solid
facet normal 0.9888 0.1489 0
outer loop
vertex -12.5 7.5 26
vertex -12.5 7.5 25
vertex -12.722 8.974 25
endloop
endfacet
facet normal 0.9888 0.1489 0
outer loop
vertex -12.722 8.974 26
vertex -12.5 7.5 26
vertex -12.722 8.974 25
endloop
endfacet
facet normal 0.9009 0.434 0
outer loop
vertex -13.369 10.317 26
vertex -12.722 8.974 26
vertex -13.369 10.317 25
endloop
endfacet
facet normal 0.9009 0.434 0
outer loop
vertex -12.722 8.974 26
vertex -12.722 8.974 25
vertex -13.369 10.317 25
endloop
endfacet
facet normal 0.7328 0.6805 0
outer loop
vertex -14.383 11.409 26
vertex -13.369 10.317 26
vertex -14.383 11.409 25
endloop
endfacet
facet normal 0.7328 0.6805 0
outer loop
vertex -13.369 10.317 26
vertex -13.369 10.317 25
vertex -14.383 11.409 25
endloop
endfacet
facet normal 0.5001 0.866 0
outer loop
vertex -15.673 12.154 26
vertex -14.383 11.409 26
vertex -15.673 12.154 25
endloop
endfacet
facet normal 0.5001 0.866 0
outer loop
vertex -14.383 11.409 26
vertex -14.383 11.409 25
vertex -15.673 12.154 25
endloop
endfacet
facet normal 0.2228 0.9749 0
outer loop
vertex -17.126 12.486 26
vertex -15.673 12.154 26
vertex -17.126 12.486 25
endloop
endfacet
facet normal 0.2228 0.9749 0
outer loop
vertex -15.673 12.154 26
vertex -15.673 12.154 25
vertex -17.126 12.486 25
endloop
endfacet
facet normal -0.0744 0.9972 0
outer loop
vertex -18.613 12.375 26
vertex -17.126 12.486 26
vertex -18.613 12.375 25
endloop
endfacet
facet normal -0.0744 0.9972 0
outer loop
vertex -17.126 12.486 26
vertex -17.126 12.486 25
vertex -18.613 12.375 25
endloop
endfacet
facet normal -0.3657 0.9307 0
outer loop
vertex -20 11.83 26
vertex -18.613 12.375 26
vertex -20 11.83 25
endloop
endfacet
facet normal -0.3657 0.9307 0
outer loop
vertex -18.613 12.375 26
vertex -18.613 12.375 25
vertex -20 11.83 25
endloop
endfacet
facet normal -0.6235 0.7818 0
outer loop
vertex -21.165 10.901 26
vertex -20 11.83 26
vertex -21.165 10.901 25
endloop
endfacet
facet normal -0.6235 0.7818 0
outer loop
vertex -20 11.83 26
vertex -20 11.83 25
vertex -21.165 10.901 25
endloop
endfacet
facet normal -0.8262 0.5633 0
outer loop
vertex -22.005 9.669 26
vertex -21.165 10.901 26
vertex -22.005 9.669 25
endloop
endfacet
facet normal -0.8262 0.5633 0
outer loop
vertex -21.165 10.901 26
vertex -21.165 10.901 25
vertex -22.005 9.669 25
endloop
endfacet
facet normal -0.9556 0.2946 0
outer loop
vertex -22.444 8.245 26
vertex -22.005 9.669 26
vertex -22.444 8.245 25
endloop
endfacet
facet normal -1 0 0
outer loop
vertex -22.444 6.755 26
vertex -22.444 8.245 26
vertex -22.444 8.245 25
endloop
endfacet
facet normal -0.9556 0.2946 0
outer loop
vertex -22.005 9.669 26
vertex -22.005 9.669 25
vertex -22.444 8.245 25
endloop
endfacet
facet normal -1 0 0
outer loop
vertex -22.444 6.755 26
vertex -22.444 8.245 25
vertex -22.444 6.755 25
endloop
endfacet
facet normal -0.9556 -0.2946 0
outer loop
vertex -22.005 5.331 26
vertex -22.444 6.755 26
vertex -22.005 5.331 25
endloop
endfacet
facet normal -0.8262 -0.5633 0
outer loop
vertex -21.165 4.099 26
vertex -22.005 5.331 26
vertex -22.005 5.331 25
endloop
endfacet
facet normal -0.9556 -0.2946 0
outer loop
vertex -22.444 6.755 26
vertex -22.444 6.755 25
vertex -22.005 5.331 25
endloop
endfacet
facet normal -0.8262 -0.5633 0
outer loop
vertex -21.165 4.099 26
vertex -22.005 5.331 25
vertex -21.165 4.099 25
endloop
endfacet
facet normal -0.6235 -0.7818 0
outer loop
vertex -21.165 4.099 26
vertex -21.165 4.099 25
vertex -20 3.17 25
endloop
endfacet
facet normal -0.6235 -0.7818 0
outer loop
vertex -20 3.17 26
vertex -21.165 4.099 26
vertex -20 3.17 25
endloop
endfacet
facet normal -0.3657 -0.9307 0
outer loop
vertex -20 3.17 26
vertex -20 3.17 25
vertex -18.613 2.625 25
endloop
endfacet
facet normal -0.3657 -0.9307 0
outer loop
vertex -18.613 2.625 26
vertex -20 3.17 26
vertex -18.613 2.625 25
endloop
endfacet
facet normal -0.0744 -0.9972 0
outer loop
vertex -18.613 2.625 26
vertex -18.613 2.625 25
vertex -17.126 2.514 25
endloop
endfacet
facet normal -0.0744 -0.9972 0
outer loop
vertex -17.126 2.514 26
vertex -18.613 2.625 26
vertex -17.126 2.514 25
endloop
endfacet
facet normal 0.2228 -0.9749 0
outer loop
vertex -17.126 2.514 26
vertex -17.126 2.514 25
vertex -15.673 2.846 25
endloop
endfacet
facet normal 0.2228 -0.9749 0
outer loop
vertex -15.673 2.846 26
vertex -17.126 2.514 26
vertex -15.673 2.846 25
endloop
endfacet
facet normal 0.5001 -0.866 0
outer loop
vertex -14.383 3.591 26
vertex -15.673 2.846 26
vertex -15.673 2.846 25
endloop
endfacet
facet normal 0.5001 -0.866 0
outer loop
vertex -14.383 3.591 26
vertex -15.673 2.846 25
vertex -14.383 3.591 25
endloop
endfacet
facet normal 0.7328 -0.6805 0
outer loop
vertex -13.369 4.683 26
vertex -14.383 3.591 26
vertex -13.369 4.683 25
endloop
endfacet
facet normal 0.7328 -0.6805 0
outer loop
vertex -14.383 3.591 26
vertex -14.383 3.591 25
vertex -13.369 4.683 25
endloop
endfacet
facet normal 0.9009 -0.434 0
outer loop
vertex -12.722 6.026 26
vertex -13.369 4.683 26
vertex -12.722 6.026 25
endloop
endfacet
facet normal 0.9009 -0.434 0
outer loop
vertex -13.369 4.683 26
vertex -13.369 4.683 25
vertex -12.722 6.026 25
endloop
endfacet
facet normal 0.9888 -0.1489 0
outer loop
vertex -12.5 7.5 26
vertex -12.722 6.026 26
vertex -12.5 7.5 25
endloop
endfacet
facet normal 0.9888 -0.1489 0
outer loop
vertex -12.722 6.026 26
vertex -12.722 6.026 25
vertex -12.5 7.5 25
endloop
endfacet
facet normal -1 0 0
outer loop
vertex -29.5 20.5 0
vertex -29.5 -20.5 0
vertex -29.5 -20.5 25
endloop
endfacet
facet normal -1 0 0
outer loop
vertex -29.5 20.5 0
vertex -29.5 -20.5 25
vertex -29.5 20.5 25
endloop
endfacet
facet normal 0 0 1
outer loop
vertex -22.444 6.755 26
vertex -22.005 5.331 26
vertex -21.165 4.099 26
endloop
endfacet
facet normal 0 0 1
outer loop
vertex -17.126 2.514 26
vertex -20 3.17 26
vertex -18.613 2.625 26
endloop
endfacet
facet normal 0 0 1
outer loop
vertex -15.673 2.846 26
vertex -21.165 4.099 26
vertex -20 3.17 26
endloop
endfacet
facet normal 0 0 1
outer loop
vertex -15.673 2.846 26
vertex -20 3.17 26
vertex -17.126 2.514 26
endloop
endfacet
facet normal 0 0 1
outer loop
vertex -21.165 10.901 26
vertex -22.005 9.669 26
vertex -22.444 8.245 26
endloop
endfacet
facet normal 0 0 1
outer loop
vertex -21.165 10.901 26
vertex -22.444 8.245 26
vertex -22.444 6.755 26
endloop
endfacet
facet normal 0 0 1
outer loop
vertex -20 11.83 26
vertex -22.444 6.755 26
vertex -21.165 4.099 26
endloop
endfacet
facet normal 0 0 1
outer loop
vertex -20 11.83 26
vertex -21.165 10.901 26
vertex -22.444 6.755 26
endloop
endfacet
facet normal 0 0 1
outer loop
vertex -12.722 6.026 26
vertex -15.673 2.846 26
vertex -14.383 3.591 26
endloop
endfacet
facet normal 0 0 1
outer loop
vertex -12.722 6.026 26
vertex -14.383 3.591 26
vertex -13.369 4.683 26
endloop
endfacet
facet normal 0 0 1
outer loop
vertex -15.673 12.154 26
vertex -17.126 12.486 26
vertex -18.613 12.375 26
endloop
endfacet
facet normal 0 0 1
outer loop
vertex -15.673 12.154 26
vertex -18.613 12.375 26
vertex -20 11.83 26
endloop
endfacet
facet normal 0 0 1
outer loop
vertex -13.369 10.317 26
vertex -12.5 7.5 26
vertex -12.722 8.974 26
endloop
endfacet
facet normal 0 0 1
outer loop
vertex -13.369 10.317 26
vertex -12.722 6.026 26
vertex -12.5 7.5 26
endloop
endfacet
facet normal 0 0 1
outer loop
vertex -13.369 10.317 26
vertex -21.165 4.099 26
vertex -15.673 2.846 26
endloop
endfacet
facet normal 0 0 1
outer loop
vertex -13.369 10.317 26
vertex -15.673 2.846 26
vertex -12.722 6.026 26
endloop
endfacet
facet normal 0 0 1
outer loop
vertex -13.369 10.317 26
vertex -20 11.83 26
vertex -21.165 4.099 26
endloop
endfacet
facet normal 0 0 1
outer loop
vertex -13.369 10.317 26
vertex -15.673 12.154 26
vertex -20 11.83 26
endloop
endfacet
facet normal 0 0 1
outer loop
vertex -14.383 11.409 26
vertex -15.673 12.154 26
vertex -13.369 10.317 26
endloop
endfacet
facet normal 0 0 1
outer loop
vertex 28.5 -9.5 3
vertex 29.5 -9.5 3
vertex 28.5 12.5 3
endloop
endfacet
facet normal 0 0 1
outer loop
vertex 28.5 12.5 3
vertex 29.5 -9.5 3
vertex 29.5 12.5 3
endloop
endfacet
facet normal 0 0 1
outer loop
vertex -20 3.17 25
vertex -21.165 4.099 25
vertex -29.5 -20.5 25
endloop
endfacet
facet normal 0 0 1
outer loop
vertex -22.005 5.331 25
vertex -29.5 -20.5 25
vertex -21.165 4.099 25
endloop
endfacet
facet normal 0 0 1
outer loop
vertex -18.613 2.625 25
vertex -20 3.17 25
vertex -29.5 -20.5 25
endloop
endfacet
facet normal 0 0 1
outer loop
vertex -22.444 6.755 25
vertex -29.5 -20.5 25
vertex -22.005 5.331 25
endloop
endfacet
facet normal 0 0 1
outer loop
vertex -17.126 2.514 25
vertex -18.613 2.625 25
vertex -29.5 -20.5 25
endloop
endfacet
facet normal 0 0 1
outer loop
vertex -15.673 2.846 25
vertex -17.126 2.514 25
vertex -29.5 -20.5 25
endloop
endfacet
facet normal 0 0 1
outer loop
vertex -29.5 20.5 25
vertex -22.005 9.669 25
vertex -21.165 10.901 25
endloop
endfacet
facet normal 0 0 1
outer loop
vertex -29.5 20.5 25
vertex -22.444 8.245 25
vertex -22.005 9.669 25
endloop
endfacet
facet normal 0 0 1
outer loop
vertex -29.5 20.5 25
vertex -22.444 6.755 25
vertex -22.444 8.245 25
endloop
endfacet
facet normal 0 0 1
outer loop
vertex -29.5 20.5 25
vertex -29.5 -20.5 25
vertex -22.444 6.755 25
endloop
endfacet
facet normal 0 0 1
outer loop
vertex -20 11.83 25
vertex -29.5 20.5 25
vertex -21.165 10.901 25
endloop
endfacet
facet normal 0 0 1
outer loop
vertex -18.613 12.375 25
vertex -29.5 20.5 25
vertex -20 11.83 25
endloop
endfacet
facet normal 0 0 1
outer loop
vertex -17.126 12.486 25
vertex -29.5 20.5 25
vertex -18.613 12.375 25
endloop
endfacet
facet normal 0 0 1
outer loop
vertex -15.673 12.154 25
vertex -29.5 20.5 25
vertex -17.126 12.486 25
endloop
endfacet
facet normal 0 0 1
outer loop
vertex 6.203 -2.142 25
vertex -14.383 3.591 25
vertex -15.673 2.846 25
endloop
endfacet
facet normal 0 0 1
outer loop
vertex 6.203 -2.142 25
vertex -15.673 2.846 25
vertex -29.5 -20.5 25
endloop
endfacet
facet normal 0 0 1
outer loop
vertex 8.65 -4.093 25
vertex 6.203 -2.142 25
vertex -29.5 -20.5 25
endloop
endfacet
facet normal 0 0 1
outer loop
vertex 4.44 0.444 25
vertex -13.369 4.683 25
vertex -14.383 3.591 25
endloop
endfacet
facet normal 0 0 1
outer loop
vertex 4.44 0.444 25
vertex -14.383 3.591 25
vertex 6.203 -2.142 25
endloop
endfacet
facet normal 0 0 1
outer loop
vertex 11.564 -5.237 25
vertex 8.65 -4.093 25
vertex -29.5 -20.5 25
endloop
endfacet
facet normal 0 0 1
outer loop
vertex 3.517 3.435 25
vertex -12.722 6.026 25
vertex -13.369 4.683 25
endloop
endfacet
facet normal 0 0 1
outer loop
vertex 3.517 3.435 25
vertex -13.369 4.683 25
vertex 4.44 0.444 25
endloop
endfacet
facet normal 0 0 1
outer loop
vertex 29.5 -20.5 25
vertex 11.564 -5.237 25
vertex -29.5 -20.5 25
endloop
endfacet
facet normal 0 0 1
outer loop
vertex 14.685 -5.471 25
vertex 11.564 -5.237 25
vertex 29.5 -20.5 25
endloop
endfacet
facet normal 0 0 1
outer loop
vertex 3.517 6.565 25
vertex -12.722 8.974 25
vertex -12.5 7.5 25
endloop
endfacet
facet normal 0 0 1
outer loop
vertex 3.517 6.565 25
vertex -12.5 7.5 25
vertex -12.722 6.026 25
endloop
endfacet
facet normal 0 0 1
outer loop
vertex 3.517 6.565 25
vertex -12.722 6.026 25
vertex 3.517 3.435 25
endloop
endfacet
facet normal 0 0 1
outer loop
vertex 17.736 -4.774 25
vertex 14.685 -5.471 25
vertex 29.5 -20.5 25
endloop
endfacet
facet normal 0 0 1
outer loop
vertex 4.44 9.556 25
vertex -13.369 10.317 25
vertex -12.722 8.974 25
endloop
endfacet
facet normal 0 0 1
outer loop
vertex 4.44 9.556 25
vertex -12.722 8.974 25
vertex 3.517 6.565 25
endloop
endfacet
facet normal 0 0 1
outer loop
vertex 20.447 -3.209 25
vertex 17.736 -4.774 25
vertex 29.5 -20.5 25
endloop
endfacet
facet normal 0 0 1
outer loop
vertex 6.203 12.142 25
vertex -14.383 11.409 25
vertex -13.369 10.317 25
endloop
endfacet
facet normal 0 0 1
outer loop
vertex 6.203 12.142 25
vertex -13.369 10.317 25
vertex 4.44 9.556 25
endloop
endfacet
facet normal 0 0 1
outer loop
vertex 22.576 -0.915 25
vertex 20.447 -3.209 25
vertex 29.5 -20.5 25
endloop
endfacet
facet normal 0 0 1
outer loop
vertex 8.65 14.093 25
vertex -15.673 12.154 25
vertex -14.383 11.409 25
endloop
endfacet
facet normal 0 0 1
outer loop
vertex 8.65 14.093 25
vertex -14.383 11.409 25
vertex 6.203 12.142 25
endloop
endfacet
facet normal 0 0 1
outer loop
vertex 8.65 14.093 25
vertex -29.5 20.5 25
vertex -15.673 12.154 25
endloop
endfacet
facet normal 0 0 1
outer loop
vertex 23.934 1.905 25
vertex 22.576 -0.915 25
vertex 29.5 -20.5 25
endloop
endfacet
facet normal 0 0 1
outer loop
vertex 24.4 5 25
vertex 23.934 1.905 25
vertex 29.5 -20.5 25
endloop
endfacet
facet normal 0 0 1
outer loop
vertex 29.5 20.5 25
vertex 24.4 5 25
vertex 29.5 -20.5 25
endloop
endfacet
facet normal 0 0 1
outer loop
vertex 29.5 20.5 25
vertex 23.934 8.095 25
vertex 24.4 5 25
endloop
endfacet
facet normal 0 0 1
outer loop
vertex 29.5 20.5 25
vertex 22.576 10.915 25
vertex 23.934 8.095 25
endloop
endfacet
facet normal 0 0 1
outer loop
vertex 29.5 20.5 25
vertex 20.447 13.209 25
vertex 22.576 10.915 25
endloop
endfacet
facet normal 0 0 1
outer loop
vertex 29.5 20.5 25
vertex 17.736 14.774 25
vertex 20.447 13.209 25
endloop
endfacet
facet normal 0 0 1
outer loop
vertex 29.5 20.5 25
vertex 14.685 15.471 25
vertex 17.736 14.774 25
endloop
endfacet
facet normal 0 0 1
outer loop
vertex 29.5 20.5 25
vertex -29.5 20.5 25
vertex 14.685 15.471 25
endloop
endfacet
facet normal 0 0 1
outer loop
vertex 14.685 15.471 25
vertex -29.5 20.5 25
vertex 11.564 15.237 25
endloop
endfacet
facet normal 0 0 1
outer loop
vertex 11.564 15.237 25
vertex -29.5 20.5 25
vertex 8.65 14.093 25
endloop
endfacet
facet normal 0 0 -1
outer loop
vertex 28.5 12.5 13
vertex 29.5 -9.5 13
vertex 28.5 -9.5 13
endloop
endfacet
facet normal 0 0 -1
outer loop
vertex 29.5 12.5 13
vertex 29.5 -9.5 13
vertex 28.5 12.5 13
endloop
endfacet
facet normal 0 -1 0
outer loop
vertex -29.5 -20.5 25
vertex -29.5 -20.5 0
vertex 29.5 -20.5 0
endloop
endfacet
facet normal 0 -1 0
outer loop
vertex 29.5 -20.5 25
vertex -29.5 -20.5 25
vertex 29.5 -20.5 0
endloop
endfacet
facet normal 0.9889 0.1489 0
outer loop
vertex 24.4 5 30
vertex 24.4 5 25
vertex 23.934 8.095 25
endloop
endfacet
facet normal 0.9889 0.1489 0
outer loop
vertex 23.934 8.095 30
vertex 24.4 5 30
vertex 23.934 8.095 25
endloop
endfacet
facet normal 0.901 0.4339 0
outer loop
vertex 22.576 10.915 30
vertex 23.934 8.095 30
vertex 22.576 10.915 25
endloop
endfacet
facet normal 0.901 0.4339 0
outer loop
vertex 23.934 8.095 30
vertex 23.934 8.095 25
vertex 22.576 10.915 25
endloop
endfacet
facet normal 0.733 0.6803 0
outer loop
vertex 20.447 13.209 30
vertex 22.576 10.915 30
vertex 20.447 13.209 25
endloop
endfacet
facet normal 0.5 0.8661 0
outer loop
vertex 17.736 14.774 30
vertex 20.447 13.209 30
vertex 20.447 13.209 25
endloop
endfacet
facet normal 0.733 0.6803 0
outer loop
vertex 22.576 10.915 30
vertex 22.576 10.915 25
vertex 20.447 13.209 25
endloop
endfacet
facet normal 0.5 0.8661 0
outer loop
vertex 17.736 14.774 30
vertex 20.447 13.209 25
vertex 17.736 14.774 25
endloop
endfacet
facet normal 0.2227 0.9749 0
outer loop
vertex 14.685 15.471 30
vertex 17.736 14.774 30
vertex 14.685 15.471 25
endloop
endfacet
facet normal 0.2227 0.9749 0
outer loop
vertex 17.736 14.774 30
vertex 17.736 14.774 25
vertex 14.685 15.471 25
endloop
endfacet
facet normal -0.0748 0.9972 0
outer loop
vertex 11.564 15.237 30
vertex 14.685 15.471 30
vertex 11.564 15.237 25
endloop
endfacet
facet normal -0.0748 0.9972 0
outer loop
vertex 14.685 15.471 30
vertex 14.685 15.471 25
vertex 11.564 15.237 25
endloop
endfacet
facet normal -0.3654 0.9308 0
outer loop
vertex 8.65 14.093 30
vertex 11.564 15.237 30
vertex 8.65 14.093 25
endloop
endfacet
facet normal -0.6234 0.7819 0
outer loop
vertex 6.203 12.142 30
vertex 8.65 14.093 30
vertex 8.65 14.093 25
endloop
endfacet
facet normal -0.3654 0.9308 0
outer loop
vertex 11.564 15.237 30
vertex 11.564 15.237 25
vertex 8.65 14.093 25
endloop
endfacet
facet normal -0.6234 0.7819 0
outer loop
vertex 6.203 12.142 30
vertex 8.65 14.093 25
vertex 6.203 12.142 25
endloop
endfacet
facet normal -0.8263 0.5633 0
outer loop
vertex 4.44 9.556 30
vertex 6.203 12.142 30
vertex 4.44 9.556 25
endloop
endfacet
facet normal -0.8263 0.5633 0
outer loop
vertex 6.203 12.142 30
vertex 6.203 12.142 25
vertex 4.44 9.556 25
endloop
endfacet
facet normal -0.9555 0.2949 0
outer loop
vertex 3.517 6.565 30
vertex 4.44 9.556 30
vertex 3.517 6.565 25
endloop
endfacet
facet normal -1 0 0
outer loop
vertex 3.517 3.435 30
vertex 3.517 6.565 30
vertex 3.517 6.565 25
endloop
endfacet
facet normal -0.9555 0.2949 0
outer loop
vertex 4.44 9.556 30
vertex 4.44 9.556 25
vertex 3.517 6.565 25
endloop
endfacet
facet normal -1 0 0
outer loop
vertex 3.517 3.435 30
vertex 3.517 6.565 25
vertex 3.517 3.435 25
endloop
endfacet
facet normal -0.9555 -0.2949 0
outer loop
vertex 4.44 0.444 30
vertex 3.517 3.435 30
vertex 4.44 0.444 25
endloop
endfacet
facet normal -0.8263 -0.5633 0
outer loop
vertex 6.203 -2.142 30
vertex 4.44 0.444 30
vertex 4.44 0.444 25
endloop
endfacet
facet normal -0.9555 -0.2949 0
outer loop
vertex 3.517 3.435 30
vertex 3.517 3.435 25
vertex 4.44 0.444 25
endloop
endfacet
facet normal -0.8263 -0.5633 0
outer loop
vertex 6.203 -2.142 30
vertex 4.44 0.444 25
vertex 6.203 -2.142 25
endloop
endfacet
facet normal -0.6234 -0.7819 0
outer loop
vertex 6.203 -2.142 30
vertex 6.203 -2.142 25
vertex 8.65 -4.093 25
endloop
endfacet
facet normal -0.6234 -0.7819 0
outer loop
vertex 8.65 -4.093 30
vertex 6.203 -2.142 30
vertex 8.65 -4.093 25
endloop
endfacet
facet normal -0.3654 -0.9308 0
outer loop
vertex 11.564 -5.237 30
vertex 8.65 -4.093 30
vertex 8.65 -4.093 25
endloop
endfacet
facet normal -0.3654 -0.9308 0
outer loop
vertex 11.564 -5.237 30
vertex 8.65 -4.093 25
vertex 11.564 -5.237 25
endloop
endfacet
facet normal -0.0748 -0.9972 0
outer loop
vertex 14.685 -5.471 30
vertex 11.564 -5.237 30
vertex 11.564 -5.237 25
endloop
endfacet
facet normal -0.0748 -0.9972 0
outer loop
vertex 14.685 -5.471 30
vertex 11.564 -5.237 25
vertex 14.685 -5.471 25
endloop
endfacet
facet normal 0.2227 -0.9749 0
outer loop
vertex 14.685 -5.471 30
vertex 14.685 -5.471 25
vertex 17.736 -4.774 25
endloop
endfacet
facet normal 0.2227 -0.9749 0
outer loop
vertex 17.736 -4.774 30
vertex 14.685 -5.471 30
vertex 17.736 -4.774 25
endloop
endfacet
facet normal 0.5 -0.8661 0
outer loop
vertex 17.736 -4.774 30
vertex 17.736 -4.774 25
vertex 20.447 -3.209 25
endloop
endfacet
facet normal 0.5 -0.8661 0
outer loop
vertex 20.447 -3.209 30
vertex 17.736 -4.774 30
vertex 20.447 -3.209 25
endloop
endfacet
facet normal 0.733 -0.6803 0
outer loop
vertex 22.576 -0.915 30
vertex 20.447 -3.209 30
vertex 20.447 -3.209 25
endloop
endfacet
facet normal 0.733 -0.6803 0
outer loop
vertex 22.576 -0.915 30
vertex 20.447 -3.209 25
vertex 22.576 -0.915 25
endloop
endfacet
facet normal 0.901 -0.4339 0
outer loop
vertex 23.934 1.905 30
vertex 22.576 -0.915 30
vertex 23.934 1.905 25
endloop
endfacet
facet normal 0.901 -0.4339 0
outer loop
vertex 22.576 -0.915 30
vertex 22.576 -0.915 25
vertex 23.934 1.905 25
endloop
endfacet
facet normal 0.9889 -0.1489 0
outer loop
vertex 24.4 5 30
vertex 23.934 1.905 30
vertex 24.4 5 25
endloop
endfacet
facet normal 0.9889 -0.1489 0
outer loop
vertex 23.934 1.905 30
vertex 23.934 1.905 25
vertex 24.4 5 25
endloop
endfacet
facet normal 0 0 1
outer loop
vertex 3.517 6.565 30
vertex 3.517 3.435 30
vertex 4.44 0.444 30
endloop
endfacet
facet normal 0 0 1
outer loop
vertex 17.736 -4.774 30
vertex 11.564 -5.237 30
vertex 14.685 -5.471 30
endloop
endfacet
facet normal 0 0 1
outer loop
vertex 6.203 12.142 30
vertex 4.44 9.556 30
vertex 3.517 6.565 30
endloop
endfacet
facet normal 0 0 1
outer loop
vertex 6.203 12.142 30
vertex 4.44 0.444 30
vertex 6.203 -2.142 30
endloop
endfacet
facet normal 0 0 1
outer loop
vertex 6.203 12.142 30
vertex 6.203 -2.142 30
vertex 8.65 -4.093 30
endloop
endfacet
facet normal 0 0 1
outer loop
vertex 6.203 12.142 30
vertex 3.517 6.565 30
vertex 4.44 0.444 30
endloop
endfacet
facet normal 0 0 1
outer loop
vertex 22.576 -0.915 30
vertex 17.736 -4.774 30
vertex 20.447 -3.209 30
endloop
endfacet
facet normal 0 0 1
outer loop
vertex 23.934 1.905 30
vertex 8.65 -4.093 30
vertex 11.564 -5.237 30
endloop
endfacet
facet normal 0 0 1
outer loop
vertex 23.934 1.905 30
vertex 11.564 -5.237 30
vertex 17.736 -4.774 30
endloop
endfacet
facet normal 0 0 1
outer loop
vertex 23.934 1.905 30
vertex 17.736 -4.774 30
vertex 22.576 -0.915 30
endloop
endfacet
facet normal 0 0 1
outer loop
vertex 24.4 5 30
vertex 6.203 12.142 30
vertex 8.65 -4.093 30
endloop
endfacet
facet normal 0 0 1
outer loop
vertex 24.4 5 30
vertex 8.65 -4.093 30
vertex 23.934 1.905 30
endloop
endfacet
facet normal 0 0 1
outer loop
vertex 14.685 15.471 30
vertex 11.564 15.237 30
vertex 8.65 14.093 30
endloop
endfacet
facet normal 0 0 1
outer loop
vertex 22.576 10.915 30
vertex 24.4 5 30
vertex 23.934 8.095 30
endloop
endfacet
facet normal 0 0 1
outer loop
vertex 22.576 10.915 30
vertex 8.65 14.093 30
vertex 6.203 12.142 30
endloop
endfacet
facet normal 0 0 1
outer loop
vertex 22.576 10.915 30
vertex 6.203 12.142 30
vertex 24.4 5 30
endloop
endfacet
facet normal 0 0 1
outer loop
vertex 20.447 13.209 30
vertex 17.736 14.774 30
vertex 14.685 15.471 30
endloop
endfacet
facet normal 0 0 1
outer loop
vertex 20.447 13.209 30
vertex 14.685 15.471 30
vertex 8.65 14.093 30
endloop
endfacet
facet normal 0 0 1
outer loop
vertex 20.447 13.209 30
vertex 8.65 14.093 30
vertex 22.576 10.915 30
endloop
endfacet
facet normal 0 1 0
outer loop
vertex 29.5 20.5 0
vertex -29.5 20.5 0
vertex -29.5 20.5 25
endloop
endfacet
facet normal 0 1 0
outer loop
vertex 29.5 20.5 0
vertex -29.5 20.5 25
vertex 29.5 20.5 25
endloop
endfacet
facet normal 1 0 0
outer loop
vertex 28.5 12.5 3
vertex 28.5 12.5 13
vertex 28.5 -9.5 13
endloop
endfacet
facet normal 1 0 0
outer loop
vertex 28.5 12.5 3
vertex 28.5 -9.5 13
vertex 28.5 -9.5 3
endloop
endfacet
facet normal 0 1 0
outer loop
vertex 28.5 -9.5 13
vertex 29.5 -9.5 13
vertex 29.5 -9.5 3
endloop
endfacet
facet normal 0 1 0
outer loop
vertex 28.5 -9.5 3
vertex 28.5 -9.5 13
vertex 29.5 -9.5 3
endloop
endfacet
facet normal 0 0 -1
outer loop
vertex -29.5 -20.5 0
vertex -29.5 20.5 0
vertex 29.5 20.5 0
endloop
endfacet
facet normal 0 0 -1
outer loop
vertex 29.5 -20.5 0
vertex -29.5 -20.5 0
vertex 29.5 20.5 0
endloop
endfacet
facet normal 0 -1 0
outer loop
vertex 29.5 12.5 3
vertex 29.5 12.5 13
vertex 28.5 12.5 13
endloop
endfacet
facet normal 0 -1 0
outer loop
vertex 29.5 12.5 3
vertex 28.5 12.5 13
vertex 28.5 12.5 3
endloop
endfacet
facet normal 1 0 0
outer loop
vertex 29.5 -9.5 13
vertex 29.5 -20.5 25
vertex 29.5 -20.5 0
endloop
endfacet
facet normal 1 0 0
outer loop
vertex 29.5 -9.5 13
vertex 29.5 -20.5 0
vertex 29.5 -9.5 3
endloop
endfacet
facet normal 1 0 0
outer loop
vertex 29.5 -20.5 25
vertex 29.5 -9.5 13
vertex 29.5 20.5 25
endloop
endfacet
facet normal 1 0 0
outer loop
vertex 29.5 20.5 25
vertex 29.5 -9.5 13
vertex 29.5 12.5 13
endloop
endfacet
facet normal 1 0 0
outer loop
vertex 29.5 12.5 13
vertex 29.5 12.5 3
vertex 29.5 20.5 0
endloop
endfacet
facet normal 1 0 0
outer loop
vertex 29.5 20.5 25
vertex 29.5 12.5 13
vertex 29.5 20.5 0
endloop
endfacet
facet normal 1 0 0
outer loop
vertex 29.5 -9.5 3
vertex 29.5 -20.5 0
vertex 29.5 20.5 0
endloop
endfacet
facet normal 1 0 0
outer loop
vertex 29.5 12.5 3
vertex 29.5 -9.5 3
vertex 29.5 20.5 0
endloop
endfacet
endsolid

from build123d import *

# Parameters (mm, degrees)
SKETCH_1_W          = 59
SKETCH_1_H          = 41
EXTRUDE_1_DEPTH     = 25
SKETCH_2_R          = 10.5
EXTRUDE_2_DEPTH     = 5
SKETCH_5_R          = 5
EXTRUDE_3_DEPTH     = 1
SKETCH_6_W          = 10
SKETCH_6_H          = 22
CUT_EXTRUDE_1_DEPTH = 1


with BuildPart() as part:
    # Эскиз1 → Бобышка-Вытянуть1 (new body)
    with BuildSketch(Plane.XY):
        Rectangle(SKETCH_1_W, SKETCH_1_H)
    extrude(amount=EXTRUDE_1_DEPTH)

    # Эскиз2 → Бобышка-Вытянуть2 (add)
    with BuildSketch(Plane.XY.offset(25)):
        with Locations((13.9, 5)):
            Circle(SKETCH_2_R)
    extrude(amount=EXTRUDE_2_DEPTH)

    # Эскиз5 → Бобышка-Вытянуть3 (add)
    with BuildSketch(Plane.XY.offset(25)):
        with Locations((-17.5, 7.5)):
            Circle(SKETCH_5_R)
    extrude(amount=EXTRUDE_3_DEPTH)

    # Эскиз6 → Вырез-Вытянуть1 (cut)
    with BuildSketch(Plane(origin=(29.5, 0, 0), x_dir=(0, 0, -1), z_dir=(1, 0, 0))):
        with Locations((-8, 1.5)):
            Rectangle(SKETCH_6_W, SKETCH_6_H)
    extrude(amount=-CUT_EXTRUDE_1_DEPTH, mode=Mode.SUBTRACT)


solid = part.part
